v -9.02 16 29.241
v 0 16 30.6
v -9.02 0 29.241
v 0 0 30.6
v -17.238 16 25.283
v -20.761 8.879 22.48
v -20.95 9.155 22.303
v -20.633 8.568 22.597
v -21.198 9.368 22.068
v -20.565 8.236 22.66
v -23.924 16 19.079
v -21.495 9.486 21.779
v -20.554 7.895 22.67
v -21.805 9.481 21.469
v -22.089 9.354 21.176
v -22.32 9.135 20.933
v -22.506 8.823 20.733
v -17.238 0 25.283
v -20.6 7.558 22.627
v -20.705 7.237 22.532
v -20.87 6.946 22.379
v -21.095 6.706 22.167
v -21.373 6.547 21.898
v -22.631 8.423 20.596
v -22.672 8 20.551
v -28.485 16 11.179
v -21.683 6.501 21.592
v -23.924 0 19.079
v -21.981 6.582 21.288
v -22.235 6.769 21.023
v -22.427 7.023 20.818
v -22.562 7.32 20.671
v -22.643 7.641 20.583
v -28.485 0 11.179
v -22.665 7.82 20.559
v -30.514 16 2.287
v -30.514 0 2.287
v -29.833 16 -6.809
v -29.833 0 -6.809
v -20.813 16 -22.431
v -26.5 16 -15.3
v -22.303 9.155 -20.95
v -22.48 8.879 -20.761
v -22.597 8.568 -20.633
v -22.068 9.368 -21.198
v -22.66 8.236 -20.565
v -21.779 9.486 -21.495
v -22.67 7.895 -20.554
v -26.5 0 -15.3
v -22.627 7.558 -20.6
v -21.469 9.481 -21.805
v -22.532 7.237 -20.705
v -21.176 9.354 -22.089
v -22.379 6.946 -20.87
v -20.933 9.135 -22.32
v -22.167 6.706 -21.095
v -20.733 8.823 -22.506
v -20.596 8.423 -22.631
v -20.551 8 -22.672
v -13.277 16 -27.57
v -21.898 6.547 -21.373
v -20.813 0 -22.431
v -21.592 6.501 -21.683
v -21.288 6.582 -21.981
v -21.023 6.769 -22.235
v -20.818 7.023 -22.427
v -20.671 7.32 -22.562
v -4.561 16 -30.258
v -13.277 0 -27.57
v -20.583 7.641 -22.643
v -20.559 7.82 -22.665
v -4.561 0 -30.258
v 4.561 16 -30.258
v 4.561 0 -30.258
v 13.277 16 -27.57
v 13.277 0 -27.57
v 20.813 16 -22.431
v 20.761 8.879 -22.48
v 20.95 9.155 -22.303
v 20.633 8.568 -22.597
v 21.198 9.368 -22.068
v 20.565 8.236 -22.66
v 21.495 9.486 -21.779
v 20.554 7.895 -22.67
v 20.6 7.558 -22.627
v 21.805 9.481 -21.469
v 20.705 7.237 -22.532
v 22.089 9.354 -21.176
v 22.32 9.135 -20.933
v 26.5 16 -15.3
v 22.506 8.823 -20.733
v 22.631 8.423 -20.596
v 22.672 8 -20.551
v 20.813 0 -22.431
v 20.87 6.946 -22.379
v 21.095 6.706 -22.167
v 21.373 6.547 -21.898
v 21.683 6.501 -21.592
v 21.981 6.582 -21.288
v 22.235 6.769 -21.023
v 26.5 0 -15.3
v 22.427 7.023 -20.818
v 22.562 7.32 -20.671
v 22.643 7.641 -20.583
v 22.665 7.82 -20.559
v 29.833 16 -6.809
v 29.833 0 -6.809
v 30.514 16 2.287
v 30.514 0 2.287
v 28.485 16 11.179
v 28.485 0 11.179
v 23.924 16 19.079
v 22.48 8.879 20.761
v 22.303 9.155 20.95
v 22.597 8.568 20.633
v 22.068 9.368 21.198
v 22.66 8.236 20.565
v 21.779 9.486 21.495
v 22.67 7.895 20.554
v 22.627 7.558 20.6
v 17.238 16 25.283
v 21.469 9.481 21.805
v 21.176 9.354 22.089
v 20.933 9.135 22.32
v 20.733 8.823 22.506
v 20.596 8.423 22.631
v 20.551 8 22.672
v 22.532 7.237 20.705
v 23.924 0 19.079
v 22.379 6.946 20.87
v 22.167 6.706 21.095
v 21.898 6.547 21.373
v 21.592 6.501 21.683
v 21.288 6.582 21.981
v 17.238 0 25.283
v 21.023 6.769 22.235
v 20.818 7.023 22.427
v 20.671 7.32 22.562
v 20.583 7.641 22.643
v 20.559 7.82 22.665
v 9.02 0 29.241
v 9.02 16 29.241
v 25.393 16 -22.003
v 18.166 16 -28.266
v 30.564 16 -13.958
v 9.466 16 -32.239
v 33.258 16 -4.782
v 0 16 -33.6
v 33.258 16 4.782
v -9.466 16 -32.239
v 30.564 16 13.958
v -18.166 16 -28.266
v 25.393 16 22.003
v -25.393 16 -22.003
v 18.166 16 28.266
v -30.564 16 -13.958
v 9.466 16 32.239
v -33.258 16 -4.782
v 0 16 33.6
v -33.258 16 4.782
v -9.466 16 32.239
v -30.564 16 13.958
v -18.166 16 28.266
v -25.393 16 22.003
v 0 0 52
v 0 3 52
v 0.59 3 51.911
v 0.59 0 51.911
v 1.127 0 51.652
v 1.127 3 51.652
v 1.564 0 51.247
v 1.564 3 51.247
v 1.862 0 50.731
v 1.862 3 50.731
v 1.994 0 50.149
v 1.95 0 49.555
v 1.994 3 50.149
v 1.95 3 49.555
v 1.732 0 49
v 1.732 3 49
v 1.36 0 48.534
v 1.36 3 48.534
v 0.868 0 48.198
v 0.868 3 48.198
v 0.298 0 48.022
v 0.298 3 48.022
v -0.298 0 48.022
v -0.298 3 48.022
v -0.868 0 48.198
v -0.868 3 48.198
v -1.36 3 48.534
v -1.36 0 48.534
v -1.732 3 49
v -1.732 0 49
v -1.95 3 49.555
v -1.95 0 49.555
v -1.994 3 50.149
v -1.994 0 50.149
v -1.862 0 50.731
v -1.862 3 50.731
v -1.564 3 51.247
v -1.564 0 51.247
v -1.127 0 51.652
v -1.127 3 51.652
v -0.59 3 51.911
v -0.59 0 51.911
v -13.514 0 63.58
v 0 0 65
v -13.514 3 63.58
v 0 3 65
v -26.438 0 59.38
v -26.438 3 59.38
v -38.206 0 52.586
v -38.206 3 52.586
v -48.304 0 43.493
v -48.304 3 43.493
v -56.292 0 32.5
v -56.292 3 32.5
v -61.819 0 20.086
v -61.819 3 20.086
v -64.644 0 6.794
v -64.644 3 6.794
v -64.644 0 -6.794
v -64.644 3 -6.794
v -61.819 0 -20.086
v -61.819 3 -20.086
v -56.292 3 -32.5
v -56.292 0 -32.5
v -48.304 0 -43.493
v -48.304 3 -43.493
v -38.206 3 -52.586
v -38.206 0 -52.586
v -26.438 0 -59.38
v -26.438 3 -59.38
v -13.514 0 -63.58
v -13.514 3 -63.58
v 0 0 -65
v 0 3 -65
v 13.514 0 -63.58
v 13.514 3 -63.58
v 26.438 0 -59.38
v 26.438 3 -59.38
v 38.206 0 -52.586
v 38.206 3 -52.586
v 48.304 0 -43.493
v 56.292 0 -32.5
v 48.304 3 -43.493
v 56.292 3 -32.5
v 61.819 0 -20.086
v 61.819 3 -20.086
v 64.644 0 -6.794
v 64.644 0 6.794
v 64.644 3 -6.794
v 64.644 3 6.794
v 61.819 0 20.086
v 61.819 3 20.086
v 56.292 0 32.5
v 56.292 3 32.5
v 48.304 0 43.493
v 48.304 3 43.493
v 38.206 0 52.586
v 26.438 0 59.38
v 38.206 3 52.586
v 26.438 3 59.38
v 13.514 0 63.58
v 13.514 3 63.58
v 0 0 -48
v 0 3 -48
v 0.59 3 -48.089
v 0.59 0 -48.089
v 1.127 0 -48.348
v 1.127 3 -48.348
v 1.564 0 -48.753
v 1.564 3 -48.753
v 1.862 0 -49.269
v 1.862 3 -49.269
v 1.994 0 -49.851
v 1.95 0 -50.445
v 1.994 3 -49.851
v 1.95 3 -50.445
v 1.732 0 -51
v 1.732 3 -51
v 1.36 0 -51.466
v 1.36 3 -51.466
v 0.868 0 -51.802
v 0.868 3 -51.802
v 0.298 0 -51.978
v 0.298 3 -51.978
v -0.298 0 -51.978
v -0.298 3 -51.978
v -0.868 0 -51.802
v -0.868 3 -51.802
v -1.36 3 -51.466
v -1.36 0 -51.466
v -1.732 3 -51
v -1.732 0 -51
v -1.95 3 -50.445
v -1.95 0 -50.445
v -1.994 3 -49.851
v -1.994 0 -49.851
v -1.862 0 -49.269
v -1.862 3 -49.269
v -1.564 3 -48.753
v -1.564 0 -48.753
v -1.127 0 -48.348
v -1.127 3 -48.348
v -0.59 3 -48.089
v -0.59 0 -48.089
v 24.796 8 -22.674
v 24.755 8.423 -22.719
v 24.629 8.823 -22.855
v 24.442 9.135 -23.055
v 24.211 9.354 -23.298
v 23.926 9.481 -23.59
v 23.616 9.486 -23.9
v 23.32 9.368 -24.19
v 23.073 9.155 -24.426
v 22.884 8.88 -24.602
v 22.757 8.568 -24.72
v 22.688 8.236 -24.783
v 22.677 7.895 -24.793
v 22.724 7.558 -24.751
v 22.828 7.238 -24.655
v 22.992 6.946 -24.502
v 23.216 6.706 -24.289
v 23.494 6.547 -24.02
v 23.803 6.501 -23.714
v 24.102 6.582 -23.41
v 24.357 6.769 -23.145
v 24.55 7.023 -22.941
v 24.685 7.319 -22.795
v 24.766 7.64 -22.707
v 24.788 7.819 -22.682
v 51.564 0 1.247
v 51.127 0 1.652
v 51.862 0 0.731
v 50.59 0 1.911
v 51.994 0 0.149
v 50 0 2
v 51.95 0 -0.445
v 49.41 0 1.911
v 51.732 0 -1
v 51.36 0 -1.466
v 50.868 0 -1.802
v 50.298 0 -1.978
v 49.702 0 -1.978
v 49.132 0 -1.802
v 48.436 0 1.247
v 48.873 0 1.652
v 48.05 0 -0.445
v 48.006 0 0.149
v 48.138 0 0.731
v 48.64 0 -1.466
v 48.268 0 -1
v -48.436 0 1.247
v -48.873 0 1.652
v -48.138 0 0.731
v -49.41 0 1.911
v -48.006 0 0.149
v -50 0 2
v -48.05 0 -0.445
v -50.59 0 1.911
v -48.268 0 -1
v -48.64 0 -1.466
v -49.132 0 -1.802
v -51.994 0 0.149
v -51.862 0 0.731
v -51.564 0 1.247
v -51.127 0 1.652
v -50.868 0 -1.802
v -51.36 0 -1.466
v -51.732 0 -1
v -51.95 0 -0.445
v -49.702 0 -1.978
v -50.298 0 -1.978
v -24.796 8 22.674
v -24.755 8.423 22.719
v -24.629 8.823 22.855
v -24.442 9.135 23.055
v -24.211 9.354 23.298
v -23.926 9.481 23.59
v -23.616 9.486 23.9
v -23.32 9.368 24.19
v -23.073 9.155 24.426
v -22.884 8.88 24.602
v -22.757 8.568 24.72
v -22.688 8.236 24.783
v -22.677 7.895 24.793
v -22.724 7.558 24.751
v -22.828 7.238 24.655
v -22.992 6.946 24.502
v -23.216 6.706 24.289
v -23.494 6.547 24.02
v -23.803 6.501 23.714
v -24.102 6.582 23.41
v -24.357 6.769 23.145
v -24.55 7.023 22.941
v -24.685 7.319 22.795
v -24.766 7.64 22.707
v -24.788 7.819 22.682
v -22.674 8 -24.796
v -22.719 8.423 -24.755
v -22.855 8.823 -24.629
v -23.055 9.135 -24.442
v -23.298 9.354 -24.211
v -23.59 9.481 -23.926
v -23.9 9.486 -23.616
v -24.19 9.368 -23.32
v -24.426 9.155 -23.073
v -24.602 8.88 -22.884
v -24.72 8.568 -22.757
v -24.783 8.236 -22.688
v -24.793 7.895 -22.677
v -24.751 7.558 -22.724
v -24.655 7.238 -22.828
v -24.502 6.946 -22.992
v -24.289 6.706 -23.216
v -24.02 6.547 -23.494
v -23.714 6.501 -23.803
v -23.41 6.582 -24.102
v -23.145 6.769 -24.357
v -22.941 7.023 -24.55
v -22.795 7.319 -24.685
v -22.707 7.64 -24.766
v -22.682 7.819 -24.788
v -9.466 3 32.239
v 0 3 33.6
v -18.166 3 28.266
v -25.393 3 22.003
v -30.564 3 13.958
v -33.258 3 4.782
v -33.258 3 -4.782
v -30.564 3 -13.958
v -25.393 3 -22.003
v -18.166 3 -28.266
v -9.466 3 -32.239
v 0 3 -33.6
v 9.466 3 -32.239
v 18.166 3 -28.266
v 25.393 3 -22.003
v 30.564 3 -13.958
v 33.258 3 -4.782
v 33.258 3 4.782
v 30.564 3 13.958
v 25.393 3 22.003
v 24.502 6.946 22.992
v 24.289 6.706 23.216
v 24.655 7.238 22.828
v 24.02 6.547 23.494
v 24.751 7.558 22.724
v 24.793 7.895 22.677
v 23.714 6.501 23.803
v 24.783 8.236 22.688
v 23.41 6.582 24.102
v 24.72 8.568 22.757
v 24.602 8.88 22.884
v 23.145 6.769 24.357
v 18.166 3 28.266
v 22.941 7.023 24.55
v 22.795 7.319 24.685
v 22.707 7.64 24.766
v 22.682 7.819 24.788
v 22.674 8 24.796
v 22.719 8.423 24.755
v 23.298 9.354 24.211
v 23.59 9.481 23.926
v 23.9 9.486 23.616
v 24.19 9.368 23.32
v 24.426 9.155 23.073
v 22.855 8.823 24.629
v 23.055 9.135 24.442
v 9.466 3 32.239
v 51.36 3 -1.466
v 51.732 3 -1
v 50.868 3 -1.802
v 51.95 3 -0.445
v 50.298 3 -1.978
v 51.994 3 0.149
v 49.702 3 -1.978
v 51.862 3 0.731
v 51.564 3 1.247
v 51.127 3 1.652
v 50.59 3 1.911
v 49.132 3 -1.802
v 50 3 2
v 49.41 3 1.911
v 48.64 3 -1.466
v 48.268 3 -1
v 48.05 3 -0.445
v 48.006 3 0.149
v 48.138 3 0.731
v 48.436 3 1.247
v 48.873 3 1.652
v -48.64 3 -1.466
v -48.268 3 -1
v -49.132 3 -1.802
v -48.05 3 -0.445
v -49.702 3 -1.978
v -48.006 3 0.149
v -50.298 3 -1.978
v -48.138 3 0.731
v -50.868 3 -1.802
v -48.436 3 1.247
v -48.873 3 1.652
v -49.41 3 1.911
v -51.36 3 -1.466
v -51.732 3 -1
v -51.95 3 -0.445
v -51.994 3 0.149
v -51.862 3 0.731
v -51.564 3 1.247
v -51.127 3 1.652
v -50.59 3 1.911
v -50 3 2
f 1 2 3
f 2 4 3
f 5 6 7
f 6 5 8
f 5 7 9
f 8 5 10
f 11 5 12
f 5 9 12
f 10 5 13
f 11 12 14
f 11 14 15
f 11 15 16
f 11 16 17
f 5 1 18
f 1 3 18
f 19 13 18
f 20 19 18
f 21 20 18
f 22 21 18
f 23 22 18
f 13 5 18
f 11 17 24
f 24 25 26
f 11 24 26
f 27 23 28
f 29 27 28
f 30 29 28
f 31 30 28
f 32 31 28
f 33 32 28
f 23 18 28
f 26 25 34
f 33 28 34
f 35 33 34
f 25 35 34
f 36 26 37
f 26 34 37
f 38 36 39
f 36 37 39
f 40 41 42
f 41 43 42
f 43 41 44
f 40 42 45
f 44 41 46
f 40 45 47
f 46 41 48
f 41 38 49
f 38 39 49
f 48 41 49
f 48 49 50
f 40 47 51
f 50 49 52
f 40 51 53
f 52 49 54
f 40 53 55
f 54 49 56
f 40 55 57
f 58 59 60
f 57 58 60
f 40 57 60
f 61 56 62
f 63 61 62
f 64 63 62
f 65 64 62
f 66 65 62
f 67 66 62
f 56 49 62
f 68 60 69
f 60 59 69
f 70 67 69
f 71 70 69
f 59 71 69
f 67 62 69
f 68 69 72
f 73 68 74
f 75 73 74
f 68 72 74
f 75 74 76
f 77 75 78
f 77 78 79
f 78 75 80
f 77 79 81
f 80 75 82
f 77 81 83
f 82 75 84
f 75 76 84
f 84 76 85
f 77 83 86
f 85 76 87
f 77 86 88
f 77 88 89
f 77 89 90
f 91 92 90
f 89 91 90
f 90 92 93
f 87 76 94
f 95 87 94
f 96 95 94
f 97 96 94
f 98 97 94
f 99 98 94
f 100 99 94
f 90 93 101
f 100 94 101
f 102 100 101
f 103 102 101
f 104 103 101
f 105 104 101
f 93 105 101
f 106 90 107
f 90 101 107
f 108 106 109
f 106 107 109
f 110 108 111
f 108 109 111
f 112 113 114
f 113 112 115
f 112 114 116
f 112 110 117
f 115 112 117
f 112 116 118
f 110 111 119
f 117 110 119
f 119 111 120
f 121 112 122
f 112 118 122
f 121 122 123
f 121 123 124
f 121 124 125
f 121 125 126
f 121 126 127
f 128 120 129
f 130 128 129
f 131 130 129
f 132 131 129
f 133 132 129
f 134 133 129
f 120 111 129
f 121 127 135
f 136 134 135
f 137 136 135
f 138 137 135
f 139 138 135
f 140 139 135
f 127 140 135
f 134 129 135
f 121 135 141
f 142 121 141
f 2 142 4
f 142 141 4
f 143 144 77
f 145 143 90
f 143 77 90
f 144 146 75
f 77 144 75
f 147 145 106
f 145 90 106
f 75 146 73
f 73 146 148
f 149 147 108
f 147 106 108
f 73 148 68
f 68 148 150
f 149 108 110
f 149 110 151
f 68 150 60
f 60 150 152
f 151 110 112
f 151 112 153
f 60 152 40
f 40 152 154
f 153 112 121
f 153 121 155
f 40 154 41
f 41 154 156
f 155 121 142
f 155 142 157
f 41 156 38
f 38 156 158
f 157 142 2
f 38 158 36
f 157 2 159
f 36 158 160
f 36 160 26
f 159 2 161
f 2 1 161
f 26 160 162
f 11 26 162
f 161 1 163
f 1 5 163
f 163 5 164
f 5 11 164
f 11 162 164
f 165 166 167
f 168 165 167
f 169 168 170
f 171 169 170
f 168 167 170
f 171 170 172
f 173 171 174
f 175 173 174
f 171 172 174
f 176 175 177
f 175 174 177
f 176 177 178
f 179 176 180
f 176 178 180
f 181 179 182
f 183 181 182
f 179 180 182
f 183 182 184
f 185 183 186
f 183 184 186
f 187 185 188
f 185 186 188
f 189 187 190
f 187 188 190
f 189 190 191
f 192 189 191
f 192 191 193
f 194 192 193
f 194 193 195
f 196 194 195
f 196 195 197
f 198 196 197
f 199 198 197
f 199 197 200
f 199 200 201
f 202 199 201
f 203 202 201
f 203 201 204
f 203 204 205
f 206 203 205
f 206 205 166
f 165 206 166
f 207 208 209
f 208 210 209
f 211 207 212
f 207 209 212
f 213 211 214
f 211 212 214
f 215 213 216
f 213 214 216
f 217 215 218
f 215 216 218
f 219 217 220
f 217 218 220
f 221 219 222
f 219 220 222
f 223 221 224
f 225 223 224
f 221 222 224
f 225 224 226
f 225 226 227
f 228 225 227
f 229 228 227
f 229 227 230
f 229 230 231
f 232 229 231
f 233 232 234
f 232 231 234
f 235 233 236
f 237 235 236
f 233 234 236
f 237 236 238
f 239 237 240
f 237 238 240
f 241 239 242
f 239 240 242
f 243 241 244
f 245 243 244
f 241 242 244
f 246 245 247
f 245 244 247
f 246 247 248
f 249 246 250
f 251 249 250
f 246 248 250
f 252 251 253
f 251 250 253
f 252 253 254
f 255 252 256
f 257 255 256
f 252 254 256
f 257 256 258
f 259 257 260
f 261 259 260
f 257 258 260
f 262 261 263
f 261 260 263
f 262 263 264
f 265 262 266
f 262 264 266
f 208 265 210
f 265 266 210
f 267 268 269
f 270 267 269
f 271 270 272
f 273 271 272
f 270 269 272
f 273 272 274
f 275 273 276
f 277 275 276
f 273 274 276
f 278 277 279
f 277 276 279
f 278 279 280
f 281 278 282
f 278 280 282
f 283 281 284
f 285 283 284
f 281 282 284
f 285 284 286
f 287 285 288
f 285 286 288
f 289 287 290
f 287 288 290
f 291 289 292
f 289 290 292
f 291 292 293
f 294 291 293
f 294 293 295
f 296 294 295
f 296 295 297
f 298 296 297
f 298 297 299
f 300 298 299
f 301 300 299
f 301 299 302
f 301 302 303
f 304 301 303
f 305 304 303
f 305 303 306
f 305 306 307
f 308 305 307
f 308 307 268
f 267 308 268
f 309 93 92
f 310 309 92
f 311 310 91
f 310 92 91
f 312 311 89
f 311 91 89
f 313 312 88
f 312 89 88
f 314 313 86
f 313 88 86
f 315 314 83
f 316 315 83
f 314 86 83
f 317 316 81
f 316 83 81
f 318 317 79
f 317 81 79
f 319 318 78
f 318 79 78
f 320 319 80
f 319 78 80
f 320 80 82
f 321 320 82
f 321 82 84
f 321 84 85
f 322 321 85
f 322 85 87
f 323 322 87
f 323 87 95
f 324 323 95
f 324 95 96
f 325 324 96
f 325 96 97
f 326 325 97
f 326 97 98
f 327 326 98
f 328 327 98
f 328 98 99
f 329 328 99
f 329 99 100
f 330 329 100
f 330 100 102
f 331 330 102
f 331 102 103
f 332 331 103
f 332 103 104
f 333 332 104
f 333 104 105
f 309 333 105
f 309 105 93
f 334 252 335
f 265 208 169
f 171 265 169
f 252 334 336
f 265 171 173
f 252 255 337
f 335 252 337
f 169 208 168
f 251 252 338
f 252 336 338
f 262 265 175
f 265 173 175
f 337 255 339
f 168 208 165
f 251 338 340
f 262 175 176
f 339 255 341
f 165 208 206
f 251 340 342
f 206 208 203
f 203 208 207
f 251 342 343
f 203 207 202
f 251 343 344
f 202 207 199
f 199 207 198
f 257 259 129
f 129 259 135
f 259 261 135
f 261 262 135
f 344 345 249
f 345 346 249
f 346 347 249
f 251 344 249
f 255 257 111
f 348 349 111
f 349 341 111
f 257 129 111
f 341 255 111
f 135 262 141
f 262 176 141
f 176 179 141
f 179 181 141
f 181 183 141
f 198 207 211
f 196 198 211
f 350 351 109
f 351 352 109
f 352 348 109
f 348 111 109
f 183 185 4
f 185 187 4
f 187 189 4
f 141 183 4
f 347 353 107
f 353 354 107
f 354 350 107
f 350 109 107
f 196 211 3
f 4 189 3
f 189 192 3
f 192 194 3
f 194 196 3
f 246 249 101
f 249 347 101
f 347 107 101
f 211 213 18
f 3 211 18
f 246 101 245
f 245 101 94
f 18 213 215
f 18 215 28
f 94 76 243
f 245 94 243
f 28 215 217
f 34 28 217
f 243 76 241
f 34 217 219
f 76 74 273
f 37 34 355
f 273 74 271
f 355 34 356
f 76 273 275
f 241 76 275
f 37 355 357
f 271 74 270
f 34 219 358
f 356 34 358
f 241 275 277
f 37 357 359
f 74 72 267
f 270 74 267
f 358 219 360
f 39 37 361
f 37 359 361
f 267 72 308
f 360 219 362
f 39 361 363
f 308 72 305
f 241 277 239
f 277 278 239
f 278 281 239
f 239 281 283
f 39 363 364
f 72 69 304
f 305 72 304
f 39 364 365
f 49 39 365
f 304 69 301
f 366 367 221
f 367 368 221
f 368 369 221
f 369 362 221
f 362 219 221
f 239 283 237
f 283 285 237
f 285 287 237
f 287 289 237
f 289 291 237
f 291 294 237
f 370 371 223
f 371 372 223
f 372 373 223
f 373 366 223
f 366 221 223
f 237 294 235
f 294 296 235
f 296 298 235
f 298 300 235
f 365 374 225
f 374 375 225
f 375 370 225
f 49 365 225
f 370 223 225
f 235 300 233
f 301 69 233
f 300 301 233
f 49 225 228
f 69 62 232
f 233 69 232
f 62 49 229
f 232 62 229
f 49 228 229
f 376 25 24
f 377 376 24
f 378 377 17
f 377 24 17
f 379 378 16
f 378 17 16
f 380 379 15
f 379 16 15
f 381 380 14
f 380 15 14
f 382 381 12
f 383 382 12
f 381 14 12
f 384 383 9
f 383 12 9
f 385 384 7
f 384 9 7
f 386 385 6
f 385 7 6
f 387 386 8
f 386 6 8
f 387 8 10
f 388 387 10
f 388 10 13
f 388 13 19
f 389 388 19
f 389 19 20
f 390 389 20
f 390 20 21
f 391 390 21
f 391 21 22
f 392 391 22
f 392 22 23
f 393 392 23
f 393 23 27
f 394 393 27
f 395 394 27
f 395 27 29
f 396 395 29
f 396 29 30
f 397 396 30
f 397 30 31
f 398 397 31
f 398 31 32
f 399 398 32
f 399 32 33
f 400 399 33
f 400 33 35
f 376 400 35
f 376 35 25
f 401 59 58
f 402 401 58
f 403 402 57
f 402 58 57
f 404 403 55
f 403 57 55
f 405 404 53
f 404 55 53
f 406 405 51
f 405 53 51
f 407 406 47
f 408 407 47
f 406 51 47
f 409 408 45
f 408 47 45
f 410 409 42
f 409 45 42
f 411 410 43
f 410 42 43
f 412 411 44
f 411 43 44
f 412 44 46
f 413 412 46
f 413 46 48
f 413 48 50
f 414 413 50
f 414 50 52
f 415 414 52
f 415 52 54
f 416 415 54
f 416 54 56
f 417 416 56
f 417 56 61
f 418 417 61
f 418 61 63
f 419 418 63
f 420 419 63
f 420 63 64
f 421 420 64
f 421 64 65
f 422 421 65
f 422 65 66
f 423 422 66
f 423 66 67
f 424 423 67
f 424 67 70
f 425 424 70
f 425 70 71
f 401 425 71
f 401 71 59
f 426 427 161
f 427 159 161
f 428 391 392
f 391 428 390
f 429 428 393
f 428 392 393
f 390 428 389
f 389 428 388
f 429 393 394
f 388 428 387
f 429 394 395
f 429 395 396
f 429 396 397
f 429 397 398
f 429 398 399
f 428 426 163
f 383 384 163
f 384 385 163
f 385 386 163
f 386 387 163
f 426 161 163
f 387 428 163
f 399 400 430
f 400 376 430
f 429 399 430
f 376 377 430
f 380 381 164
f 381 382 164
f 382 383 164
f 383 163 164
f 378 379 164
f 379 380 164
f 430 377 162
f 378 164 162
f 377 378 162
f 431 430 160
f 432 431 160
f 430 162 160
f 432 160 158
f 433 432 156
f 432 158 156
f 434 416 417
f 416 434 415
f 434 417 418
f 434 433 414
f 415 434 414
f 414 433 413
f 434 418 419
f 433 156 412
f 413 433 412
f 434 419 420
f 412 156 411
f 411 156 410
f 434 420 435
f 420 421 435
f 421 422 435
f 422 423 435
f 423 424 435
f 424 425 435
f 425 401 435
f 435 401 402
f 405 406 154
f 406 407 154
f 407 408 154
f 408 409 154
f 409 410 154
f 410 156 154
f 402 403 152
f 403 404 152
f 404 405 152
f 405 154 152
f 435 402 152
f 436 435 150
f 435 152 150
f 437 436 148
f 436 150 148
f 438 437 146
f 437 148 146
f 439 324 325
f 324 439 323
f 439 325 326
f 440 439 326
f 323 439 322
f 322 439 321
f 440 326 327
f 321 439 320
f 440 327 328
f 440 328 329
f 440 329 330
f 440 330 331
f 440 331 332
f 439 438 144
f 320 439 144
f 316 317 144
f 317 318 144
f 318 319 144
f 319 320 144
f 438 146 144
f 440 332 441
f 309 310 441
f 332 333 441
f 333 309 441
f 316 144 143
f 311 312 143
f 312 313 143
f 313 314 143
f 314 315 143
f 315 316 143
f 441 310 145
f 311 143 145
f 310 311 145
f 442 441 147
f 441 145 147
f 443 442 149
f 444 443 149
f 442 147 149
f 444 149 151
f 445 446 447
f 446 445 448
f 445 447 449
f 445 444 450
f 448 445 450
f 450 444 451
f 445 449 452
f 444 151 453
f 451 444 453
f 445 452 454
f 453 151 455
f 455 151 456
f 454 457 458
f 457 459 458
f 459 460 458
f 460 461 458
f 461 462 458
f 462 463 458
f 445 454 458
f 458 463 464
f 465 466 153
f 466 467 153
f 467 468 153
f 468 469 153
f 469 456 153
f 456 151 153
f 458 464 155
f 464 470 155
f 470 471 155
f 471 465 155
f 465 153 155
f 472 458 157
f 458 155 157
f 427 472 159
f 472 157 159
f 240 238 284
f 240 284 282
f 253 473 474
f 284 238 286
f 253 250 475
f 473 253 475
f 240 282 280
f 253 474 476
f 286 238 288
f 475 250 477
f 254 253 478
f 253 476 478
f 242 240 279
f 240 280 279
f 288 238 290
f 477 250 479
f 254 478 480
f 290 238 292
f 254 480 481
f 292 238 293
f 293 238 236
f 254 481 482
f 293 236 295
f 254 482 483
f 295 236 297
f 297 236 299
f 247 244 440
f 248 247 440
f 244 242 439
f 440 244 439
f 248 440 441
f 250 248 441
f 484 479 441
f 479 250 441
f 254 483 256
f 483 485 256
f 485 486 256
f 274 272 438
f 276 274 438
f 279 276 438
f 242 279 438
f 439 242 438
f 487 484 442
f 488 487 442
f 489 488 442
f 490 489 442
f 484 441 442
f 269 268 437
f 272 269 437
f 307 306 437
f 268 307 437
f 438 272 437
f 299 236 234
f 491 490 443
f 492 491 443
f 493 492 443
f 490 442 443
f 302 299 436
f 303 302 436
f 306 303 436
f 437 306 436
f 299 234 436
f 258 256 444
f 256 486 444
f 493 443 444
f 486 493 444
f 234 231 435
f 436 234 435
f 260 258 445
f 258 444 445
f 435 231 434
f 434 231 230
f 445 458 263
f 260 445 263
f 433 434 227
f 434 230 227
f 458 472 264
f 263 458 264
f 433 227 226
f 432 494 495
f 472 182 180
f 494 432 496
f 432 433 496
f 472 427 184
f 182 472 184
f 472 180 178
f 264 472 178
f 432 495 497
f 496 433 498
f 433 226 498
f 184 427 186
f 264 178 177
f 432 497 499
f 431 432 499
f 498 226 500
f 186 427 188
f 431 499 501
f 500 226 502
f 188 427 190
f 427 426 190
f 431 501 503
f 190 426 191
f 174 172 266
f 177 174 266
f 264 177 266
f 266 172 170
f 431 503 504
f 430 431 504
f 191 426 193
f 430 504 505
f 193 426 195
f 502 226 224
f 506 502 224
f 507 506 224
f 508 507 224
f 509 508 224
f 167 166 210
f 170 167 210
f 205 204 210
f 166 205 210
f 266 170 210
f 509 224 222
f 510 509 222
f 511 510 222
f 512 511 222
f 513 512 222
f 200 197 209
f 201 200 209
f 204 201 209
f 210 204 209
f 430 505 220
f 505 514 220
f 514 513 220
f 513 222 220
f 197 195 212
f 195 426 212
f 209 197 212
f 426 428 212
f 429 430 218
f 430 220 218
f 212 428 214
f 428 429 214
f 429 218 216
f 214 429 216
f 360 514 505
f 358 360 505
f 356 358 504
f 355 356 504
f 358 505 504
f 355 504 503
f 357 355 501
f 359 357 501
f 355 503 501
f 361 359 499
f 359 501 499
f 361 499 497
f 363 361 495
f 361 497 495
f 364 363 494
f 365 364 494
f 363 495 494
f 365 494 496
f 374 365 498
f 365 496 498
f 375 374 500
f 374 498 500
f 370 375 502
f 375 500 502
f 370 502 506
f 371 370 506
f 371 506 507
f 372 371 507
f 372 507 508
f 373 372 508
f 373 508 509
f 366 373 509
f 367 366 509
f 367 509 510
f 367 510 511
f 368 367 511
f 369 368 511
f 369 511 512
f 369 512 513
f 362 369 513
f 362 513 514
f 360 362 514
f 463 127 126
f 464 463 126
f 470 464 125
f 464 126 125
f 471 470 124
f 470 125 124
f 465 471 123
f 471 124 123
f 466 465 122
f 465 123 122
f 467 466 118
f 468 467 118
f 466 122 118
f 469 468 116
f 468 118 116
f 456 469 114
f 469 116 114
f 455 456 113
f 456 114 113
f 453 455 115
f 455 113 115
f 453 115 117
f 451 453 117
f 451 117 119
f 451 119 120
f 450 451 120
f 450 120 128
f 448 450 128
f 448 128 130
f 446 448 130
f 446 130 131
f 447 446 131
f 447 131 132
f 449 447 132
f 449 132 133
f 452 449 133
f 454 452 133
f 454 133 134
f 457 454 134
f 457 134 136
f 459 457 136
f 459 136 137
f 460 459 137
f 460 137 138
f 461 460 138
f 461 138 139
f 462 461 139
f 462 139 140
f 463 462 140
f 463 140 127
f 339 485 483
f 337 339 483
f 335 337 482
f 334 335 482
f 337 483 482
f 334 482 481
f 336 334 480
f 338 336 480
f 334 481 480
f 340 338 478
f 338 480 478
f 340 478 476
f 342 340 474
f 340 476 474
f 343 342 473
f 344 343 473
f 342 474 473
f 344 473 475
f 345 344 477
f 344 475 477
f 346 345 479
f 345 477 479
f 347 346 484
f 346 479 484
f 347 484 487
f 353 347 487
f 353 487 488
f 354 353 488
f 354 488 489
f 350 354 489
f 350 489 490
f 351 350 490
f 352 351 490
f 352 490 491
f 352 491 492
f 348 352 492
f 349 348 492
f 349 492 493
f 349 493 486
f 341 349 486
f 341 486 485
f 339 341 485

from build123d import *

# Parameters (mm, degrees)
SKETCH3_R          = 2
CUT_EXTRUDE1_DEPTH = 93.838569571
SKETCH5_R          = 1.5
CUT_EXTRUDE2_DEPTH = 94.305948363
CIRPATTERN1_COUNT  = 4


with BuildPart() as part:
    # Sketch2 → Revolve1 (revolve)
    with BuildSketch(Plane.XY, mode=Mode.PRIVATE) as revolve1_sk:
        Polygon((30.6, 16), (30.6, 0), (65, 0), (65, 3), (33.6, 3), (33.6, 16), align=None)
    revolve(revolve1_sk.sketch.rotate(Axis((0, 31.868523677, 0), (0, -1, 0)), 90), axis=Axis((0, 31.868523677, 0), (0, -1, 0)))

    # Sketch3 → Cut-Extrude1 (cut, through all)
    with BuildSketch(Plane(origin=(0, 3, 0), x_dir=(1, 0, 0), z_dir=(0, 1, 0))):
        with Locations(Location((0, 50, 0), (0, 0, 270))):
            Circle(SKETCH3_R)
        with Locations(Location((50, 0, 0), (0, 0, 270))):
            Circle(SKETCH3_R)
        with Locations(Location((0, -50, 0), (0, 0, 270))):
            Circle(SKETCH3_R)
        with Locations(Location((-50, 0, 0), (0, 0, 270))):
            Circle(SKETCH3_R)
    extrude(amount=-CUT_EXTRUDE1_DEPTH, mode=Mode.SUBTRACT)

    # Sketch5 → Cut-Extrude2 (cut, through all)
    with BuildSketch(Plane(origin=(0, 0, 0), x_dir=(0, 1, 0), z_dir=(0.7071067811865488, 0, 0.7071067811865464))):
        with Locations(Location((8, 0, 0), (0, 0, 270))):
            Circle(SKETCH5_R)
    cut_extrude2 = extrude(amount=-CUT_EXTRUDE2_DEPTH, mode=Mode.SUBTRACT)

    # CirPattern1: Cut-Extrude2 ×4 about axis
    cirpattern1_axis = Axis((0, 31.868523677, 0), (0, 1, 0))
    for i in range(1, CIRPATTERN1_COUNT):
        add(cut_extrude2.rotate(cirpattern1_axis, i * 360 / CIRPATTERN1_COUNT), mode=Mode.SUBTRACT)


solid = part.part
